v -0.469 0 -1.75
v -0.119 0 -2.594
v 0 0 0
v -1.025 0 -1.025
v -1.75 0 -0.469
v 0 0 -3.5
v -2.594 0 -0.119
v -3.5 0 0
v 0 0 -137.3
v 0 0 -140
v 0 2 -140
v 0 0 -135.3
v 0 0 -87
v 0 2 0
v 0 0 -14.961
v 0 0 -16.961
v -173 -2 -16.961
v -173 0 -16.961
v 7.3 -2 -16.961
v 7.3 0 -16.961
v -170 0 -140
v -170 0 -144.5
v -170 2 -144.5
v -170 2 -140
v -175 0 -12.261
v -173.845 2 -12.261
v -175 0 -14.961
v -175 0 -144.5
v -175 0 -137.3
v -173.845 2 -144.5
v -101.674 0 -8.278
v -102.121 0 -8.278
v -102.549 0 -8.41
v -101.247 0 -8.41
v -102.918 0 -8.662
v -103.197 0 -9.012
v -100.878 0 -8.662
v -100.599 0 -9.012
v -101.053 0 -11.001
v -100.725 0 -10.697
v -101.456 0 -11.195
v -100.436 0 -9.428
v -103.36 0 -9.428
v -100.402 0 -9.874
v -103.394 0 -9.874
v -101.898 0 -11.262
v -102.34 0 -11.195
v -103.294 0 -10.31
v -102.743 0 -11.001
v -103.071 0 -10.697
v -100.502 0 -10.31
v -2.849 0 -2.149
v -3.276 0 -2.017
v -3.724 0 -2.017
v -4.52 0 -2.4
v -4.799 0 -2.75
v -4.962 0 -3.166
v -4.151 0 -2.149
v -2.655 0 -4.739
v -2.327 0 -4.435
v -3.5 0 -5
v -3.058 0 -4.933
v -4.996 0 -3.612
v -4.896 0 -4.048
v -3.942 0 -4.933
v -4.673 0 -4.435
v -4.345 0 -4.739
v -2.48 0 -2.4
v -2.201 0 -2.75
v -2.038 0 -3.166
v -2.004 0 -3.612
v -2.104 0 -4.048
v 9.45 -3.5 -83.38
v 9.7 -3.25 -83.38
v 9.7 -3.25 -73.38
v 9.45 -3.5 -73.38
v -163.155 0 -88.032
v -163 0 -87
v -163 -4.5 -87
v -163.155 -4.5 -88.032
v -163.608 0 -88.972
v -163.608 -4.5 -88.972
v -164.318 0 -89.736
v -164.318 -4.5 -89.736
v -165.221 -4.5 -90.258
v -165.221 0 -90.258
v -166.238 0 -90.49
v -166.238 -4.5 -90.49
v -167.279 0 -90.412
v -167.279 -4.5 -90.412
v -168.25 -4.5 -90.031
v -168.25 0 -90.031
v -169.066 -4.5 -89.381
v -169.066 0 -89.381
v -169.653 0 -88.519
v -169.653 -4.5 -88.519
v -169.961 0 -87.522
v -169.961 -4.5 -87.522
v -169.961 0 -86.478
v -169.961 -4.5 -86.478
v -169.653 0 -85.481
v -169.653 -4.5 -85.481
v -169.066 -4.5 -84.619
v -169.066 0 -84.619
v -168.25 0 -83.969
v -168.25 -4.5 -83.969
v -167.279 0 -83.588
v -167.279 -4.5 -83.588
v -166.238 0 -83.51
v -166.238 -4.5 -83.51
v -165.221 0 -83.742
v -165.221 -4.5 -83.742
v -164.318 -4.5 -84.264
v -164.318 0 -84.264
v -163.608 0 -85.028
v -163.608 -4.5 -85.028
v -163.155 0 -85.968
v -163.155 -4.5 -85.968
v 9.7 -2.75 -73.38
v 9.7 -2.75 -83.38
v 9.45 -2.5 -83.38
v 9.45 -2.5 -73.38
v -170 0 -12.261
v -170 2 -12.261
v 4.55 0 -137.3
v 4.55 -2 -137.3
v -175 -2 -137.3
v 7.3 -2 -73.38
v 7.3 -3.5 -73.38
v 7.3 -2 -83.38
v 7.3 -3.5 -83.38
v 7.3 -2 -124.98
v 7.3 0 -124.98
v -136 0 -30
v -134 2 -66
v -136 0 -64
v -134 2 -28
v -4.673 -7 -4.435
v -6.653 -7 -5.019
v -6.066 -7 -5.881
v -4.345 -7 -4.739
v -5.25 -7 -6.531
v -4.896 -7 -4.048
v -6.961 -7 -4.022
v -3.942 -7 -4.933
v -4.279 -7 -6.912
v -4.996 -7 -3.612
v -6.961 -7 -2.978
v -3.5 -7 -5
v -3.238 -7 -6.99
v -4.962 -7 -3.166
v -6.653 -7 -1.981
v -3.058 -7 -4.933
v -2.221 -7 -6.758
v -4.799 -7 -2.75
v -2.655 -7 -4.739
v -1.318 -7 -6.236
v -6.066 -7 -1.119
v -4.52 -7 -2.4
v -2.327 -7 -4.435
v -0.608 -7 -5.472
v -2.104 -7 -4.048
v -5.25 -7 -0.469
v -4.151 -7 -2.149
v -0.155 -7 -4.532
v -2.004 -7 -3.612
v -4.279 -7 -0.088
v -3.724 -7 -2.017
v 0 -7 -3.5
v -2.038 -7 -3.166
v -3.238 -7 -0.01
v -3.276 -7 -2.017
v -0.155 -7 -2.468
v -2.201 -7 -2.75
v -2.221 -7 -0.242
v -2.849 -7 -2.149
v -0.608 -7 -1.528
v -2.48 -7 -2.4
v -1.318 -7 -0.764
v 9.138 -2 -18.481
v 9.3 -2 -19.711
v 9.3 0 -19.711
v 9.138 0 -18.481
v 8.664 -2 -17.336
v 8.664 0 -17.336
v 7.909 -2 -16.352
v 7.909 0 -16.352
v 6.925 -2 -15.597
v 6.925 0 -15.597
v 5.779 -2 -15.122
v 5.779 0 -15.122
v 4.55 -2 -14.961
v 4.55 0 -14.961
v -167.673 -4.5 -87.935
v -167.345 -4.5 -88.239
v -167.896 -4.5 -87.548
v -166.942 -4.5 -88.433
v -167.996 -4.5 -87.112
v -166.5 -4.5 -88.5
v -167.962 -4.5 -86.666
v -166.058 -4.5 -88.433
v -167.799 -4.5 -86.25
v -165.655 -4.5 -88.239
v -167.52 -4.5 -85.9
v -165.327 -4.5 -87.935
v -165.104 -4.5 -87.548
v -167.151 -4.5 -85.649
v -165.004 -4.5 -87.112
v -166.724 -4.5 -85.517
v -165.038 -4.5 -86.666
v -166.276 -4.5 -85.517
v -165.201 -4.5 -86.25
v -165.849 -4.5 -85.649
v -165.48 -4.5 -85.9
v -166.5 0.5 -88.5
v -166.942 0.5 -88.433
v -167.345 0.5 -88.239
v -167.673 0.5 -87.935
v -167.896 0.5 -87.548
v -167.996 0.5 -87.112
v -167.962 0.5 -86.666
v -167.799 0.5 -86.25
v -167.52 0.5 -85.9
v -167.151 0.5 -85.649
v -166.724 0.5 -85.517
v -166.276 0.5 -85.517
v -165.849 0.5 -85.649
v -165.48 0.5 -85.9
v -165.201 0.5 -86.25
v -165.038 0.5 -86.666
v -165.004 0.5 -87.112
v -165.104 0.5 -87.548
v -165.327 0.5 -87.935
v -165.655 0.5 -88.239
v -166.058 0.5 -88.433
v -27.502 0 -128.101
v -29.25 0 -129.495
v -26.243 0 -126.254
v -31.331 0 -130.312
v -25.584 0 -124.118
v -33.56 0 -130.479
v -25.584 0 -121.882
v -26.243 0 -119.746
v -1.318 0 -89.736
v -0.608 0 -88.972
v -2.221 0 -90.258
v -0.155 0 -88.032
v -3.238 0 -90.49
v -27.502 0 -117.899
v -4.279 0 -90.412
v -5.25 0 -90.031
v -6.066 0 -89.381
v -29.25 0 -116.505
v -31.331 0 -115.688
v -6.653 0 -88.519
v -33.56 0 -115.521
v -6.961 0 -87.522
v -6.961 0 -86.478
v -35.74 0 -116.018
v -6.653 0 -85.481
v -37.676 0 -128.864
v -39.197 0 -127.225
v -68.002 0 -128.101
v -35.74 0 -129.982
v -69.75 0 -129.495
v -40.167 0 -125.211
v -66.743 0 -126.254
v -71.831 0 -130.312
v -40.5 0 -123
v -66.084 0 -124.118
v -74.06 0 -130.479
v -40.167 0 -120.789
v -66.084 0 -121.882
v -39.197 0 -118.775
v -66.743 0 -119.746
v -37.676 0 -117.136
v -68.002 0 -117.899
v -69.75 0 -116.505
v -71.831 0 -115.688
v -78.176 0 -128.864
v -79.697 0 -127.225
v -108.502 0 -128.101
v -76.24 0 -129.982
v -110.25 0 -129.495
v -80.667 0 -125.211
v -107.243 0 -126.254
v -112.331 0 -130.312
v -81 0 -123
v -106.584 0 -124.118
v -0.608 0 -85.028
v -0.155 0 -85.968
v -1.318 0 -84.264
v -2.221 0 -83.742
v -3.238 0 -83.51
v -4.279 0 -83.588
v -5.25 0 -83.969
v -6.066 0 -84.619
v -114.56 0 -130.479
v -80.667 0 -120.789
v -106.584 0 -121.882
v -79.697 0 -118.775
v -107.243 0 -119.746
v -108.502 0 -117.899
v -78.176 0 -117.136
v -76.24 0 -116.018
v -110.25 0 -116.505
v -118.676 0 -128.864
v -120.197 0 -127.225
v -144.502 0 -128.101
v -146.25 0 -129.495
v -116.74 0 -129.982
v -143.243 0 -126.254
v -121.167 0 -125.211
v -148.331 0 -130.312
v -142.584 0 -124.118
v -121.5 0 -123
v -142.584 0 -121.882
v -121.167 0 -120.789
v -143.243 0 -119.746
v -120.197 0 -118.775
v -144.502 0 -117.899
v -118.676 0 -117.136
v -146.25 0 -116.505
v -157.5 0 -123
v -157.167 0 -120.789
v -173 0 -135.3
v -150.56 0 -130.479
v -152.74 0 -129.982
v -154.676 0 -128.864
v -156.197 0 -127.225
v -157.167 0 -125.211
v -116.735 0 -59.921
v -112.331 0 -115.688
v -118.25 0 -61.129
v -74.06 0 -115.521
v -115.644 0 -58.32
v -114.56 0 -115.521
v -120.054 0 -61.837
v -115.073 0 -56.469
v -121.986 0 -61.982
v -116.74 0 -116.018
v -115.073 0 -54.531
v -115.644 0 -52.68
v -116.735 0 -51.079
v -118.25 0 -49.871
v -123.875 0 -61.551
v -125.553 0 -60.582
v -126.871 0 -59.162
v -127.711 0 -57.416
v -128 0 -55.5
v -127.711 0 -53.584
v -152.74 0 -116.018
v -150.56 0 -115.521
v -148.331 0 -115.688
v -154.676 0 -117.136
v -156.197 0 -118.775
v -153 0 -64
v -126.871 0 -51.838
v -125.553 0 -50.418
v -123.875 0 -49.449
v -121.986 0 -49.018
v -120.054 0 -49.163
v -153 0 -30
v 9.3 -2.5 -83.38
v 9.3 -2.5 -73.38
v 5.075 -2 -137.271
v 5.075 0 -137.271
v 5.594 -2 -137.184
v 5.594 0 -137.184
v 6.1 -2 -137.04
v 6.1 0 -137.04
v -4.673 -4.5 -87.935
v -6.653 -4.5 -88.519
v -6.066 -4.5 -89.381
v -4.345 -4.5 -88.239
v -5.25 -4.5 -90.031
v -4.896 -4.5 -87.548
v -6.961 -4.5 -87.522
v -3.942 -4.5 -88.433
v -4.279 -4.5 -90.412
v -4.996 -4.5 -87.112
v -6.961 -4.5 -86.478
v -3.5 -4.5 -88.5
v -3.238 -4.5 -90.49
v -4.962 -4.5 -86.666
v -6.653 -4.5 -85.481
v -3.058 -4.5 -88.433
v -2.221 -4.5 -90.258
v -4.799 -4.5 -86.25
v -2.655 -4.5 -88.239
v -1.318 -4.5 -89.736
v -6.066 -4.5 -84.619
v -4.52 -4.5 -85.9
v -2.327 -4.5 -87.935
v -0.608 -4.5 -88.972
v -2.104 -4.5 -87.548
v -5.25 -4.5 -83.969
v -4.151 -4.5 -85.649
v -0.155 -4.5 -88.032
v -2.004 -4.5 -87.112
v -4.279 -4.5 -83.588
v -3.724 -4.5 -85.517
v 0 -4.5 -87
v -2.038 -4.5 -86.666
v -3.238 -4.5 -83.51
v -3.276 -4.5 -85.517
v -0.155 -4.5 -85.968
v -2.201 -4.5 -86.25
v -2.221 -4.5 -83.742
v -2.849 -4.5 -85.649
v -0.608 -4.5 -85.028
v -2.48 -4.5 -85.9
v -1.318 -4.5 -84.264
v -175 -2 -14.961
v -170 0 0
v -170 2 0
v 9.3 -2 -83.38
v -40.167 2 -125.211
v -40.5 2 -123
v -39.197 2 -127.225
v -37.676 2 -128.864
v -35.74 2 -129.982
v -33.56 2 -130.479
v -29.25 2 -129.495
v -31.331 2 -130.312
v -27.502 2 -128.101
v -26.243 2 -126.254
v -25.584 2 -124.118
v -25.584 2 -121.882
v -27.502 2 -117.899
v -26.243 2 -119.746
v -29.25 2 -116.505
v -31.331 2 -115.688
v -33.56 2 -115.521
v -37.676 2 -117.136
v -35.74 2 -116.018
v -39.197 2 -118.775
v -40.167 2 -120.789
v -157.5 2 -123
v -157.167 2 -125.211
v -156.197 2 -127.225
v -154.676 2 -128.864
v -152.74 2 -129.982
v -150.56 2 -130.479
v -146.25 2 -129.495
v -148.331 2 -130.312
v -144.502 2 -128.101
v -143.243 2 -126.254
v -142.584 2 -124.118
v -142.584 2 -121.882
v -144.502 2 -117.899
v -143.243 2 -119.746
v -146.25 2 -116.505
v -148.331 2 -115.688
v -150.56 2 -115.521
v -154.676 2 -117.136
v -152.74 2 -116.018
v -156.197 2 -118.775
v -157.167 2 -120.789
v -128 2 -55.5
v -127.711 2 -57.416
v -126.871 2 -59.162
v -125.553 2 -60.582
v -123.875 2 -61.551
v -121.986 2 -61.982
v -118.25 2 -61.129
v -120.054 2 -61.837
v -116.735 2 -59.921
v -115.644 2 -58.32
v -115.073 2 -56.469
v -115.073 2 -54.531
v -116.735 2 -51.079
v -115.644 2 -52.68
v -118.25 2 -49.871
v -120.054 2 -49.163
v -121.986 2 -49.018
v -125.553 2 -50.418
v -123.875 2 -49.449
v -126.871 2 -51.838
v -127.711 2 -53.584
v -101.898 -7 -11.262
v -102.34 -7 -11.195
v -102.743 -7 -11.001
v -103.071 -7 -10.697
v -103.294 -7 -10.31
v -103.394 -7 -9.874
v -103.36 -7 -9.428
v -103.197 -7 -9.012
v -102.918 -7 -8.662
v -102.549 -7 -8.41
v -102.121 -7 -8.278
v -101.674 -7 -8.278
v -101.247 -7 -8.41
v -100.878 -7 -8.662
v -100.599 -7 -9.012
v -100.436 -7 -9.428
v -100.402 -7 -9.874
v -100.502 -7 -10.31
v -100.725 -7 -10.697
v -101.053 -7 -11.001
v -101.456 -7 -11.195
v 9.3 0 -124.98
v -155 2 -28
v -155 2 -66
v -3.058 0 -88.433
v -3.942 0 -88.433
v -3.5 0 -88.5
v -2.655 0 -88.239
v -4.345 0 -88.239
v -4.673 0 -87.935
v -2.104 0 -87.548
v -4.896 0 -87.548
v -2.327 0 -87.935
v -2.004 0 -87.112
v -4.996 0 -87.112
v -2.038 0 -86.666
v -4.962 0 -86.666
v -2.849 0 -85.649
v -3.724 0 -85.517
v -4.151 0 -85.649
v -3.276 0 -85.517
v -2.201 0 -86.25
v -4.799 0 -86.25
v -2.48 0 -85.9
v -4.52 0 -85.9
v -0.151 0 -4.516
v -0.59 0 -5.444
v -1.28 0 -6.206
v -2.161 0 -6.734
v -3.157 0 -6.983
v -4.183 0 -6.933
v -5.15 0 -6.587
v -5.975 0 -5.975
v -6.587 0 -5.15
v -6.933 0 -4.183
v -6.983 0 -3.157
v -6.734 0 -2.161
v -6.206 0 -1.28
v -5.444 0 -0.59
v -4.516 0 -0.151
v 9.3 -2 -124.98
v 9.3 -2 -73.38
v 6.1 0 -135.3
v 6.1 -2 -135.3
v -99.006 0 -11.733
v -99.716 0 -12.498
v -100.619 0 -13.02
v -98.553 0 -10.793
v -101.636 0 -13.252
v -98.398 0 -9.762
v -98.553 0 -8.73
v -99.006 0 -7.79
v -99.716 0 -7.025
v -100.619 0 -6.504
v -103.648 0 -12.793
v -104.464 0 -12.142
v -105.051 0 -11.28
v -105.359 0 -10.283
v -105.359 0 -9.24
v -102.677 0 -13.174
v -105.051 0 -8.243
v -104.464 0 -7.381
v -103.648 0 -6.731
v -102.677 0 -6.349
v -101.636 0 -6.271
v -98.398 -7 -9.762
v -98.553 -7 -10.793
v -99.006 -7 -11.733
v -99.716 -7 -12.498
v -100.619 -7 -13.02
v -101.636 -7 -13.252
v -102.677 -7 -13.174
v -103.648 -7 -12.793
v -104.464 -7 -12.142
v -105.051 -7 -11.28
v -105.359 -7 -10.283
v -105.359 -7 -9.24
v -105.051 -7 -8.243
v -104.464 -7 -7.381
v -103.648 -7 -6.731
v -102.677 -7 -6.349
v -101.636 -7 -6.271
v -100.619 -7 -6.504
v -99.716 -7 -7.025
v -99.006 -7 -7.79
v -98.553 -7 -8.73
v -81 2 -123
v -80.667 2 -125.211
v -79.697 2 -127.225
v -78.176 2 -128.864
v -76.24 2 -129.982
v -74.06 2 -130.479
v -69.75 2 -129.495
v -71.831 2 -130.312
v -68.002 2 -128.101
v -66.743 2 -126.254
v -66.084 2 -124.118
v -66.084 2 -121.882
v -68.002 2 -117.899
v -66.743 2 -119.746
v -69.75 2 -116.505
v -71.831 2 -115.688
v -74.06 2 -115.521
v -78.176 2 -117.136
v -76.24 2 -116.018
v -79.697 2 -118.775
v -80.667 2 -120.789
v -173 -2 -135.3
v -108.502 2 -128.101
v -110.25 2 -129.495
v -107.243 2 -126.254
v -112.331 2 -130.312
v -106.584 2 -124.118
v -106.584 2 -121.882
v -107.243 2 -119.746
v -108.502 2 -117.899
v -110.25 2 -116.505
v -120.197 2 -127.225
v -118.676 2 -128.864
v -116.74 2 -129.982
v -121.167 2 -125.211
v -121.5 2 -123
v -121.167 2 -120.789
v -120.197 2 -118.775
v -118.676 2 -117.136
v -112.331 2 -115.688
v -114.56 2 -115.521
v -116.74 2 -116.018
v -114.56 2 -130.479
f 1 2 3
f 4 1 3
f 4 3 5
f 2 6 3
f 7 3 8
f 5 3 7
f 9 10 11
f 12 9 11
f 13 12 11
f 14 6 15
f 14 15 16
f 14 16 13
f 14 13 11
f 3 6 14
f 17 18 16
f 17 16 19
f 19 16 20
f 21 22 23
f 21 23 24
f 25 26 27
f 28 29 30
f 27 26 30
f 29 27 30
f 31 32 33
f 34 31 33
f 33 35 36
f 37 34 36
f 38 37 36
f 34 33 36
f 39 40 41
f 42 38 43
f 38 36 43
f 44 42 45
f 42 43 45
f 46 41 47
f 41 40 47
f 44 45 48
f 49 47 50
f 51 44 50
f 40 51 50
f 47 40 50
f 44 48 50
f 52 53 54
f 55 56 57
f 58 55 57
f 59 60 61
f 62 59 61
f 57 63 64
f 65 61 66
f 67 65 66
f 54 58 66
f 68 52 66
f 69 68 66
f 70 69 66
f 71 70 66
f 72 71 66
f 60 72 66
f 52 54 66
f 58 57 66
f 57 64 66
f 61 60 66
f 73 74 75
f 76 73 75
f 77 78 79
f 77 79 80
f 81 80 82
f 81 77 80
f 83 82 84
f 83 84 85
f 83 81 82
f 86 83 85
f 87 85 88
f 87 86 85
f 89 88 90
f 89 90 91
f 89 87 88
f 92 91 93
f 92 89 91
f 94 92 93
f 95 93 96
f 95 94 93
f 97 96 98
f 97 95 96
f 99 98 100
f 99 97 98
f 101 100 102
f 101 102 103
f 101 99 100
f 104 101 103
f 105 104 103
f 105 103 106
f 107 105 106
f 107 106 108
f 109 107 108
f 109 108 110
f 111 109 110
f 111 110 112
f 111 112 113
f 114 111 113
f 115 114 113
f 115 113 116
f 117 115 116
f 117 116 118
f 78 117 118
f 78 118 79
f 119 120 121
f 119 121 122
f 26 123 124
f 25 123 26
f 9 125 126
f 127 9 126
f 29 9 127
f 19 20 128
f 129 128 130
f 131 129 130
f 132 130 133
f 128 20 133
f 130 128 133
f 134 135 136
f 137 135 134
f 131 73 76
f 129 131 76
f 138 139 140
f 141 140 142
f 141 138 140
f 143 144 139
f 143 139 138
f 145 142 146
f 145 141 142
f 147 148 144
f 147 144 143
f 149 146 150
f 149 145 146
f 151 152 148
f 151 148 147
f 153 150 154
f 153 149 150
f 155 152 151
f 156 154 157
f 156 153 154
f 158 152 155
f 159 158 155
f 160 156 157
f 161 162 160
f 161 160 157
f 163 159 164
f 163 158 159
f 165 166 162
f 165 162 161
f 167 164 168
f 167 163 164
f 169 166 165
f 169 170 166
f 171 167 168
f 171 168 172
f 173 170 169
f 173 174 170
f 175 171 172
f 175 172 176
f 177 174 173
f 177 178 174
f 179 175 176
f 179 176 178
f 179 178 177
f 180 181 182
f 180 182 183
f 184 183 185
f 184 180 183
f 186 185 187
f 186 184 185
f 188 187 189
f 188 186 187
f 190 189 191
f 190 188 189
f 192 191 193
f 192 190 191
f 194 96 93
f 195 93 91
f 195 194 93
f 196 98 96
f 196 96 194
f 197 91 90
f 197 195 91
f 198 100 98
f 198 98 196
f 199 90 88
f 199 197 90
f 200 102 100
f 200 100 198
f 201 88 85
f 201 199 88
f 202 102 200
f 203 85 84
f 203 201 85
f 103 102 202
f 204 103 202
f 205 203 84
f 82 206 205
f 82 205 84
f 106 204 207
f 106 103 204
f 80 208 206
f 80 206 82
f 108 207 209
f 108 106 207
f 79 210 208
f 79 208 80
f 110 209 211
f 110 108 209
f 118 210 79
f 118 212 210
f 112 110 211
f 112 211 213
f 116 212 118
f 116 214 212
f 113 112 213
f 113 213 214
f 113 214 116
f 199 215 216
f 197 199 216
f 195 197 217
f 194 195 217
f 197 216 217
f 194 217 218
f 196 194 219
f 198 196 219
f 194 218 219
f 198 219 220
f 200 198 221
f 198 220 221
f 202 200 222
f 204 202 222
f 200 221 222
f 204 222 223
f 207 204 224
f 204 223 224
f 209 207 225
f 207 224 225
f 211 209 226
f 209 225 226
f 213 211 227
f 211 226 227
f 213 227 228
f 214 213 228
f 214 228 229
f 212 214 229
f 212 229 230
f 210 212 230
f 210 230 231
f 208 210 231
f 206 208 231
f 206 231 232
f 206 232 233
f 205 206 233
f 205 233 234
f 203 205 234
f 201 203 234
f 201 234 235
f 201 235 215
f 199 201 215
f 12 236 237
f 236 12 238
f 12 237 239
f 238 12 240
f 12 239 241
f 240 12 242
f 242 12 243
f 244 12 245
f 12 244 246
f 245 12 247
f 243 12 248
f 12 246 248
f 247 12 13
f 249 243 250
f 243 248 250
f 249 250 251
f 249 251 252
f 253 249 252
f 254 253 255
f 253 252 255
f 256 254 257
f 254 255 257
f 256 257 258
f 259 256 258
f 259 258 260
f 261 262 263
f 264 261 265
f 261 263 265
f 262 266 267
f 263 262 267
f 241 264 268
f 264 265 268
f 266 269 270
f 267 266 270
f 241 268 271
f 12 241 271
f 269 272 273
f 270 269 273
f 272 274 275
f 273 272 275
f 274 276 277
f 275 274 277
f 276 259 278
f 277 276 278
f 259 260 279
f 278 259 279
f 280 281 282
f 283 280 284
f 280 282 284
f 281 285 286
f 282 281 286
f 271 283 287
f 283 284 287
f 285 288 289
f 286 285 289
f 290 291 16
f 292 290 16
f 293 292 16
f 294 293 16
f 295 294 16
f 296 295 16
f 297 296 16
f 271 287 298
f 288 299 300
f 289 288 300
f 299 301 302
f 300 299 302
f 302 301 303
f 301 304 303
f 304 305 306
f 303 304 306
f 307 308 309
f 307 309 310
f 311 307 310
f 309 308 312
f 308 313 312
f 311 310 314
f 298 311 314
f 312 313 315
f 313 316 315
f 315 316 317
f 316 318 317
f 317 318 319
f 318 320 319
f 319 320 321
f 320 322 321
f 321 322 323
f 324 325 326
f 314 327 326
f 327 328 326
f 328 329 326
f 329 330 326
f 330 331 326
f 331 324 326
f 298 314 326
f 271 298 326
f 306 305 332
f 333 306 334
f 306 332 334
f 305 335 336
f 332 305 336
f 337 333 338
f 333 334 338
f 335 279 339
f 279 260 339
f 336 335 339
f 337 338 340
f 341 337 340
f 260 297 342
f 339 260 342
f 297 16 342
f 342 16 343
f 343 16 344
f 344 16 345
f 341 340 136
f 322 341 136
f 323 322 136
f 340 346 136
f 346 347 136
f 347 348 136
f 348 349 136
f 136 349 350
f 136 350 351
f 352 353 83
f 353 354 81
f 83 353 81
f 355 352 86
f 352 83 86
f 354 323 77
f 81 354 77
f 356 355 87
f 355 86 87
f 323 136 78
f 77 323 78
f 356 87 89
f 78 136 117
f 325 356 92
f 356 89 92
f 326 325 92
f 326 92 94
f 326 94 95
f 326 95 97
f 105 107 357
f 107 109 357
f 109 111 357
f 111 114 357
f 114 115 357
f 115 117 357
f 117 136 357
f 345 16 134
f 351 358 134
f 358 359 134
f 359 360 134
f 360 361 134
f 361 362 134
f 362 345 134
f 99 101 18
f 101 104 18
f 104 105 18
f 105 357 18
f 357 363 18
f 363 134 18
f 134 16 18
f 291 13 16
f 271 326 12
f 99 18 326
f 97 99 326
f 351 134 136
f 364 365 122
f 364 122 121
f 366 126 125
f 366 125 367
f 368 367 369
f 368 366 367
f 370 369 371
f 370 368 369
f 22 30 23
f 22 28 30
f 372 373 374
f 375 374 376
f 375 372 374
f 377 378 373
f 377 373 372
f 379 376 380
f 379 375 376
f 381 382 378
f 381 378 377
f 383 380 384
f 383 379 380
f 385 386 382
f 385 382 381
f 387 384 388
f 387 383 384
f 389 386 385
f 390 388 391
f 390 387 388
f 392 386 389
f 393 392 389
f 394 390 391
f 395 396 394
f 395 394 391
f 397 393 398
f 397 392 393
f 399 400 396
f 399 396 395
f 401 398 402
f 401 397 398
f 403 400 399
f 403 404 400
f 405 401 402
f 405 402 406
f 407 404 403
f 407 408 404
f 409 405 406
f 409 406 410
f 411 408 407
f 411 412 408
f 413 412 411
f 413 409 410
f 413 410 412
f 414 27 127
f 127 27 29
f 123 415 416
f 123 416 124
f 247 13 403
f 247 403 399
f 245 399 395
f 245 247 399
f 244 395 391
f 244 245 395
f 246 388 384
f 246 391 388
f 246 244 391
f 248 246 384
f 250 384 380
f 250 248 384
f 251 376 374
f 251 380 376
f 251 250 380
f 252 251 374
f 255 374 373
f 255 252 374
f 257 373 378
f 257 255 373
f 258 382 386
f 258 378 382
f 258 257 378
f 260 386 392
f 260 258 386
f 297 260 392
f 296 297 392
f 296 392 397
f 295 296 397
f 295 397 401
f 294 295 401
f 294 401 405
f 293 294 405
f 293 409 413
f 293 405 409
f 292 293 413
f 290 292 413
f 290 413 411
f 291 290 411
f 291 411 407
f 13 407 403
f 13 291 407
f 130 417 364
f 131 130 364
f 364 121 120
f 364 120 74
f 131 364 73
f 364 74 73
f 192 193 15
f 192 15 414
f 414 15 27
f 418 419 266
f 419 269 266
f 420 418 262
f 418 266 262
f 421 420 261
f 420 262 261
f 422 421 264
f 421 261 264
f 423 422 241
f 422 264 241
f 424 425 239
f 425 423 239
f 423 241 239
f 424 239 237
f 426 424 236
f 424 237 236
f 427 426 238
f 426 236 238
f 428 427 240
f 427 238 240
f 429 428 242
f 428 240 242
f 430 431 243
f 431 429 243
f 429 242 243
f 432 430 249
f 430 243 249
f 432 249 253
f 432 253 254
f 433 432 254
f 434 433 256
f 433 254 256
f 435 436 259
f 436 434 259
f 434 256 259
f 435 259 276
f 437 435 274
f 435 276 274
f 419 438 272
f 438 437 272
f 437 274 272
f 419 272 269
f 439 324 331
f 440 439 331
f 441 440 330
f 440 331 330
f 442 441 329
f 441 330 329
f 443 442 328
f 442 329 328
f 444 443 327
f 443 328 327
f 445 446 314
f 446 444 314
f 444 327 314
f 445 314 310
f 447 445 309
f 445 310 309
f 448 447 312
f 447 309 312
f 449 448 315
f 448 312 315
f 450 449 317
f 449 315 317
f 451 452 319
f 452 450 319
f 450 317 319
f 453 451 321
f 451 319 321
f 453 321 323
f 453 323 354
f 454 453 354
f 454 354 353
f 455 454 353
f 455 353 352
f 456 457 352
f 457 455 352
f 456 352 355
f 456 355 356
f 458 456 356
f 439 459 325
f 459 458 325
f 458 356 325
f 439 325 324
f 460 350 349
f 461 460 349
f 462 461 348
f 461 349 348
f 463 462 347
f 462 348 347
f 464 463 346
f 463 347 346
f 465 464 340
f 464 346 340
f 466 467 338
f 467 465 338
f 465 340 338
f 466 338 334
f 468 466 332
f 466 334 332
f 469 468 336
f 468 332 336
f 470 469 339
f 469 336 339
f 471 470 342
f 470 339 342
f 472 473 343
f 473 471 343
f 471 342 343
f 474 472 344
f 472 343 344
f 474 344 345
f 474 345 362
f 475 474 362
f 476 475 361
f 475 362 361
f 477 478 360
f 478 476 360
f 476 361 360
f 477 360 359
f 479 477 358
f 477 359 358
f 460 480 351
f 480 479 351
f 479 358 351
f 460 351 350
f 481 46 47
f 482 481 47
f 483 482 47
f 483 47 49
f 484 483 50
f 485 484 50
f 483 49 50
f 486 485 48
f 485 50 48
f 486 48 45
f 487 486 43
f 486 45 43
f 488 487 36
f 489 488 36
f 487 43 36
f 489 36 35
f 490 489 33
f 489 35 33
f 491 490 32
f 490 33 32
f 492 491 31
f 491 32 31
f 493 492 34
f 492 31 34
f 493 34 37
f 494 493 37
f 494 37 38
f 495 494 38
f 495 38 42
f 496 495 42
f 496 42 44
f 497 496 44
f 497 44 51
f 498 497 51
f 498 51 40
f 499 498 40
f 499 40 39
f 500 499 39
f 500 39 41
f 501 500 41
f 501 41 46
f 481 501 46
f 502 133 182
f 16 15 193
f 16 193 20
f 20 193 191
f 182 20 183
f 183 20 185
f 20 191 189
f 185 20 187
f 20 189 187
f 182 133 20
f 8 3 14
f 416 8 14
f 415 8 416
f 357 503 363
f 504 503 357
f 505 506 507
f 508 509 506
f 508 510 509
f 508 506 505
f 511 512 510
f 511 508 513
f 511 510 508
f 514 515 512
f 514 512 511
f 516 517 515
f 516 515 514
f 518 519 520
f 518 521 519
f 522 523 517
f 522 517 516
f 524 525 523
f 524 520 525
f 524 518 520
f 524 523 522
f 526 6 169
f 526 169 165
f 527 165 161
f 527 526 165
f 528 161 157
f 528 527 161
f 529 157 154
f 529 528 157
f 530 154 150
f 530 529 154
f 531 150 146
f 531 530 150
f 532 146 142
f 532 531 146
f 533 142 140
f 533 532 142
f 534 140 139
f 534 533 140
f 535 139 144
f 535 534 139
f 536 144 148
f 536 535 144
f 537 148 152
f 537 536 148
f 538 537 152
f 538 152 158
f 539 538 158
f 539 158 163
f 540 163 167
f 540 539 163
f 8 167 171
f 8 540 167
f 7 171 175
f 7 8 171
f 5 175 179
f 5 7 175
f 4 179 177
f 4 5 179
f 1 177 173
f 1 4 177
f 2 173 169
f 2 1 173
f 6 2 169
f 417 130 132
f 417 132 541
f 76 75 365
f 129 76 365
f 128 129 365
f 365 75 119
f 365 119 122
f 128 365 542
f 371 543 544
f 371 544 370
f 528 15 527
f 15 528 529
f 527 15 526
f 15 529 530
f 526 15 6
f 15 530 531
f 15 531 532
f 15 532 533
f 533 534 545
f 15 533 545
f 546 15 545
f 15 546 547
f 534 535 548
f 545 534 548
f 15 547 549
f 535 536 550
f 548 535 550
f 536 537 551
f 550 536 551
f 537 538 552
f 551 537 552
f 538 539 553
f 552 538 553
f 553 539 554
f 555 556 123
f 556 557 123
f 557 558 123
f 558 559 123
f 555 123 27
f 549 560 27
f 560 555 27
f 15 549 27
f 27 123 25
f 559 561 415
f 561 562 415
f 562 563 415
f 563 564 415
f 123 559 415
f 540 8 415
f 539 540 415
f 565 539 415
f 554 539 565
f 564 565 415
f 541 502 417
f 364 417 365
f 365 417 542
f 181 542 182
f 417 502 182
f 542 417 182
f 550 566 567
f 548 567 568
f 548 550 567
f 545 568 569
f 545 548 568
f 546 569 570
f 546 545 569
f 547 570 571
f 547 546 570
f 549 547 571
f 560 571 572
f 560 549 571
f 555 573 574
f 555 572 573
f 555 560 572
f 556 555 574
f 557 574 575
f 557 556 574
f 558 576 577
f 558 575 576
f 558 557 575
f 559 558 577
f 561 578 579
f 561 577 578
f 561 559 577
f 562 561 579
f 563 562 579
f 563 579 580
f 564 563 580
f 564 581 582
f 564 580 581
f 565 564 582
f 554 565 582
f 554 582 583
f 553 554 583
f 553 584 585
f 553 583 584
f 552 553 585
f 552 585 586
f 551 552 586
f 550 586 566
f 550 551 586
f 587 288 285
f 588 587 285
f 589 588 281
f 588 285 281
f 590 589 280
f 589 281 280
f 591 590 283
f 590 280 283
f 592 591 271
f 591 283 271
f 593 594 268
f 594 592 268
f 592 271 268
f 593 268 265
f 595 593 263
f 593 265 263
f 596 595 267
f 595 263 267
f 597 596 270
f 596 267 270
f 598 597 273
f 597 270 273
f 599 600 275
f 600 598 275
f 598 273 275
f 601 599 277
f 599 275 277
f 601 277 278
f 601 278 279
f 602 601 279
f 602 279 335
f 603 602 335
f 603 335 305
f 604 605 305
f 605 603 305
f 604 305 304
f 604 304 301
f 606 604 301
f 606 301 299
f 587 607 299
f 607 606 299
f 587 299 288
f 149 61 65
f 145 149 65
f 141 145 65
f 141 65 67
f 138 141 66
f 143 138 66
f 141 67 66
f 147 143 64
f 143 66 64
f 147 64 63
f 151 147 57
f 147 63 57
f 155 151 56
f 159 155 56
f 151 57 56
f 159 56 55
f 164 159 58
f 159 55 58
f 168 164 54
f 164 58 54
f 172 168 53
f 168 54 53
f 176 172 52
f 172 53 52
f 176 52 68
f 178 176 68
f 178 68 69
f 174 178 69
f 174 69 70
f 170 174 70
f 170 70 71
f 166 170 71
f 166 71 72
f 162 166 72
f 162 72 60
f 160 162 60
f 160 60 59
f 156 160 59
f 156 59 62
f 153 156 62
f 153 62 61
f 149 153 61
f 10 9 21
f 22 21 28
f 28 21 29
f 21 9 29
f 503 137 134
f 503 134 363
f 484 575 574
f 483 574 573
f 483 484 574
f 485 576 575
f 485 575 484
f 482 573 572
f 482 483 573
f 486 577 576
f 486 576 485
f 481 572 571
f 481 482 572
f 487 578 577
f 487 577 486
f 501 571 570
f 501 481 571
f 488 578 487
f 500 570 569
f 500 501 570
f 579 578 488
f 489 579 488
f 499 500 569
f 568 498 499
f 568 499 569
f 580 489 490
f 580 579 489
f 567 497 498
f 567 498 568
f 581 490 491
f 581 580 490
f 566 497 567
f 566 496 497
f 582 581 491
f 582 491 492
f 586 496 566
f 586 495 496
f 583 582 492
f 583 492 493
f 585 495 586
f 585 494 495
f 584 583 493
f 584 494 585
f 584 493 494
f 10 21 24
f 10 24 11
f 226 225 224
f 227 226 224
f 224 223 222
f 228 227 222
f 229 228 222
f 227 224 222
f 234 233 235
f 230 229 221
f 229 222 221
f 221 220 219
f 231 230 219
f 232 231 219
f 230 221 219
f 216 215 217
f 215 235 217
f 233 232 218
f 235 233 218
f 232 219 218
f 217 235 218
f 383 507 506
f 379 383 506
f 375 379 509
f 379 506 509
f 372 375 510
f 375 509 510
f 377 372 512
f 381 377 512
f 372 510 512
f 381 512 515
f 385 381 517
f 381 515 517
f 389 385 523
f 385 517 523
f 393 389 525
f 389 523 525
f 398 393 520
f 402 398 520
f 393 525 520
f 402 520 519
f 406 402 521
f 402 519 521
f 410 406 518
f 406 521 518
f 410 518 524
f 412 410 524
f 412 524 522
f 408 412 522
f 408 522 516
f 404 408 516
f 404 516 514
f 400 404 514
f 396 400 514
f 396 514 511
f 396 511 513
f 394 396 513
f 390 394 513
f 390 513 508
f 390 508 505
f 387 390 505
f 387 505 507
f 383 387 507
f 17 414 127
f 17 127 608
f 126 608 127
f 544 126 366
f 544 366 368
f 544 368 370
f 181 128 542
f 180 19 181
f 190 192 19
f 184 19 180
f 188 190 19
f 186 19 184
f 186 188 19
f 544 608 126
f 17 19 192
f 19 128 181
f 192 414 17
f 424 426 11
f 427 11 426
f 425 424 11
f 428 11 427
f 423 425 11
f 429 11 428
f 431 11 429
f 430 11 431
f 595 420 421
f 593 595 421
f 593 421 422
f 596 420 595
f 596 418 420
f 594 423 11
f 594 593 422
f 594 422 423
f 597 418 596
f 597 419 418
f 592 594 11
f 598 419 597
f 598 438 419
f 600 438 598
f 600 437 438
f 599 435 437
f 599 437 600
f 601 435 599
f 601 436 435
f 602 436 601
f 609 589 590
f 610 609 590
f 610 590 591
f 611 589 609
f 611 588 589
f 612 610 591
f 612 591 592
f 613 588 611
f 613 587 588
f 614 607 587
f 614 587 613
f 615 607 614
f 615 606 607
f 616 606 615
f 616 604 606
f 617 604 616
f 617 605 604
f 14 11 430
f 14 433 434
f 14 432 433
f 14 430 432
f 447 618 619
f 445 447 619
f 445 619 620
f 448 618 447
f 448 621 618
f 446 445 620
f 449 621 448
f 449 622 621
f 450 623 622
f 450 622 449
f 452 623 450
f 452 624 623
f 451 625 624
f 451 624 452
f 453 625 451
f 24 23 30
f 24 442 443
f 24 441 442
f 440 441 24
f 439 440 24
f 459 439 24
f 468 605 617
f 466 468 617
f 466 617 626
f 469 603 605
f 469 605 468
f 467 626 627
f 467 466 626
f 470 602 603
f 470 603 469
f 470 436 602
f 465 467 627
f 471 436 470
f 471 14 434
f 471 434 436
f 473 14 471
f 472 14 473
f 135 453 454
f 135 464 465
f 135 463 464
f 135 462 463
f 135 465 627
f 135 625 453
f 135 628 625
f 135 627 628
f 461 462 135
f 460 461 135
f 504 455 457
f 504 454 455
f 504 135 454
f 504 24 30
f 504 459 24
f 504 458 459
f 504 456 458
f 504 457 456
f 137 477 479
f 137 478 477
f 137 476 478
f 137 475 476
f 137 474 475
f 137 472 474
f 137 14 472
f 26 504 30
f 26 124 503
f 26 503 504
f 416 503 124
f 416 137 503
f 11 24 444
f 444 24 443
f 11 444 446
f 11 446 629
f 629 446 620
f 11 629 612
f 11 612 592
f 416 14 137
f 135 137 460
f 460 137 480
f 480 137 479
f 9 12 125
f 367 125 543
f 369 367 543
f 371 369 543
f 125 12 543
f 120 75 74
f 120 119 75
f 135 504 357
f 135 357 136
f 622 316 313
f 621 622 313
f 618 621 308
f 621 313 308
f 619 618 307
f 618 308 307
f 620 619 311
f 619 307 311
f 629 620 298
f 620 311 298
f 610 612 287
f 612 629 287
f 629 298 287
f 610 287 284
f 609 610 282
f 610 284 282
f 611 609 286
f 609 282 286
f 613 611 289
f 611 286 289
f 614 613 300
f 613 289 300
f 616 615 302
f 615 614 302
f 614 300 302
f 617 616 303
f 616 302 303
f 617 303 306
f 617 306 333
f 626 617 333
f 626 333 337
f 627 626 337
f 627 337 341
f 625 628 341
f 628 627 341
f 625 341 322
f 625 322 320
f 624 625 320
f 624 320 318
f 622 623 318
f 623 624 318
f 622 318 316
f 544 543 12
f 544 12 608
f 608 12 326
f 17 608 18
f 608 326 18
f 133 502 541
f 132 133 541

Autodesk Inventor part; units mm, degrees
ref_plane "YZ Plane" through (0, 0, 0) normal (1, 0, 0) x (0, 1, 0)
ref_plane "XZ Plane" through (0, 0, 0) normal (0, 1, 0) x (-1, 0, 0)
ref_plane "XY Plane" through (0, 0, 0) normal (0, 0, 1) x (1, 0, 0)
sketch "Skizze1" plane through (0, 0, 0) normal (0, 1, 0) x (-1, 0, 0)
  line L0 (0, 0) -> (170, 0)
  line L1 (170, 0) -> (170, -140)
  line L2 (170, -140) -> (0, -140)
  line L3 (0, -140) -> (0, 0)
  circle A0 centre (150, -123) radius 7.5
  circle A1 centre (114, -123) radius 7.5
  circle A2 centre (73.5, -123) radius 7.5
  circle A3 centre (33, -123) radius 7.5
  line L4 (153, -30) -> (136, -30)
  line L5 (136, -30) -> (136, -64)
  line L6 (136, -64) -> (153, -64)
  line L7 (153, -64) -> (153, -30)
  circle A4 centre (121.5, -55.5) radius 6.5
  line L8 (150, -123) -> (0, -123) construction
  dimension "d0" = 170
  dimension "d1" = 140
  dimension "d2" = 15
  dimension "d3" = 123
  dimension "d4" = 20
  dimension "d8" = 56
  dimension "d9" = 96.5
  dimension "d10" = 137
  dimension "d11" = 17
  dimension "d12" = 34
  dimension "d13" = 30
  dimension "d14" = 17
  dimension "d15" = 13
  dimension "d17" = 48.5
  dimension "d100" = 25.5
extrude "Extrusion1" add sketch "Skizze1" along normal blind 2
chamfer "Fase1" distance 2 angle 45 4 edges at (-153, 2, -47) (-144.5, 2, -64) (-136, 2, -47) (-144.5, 2, -30)
sketch "Skizze2" plane through (0, 0, 0) normal (0, -1, 0) x (1, 0, 0)
  circle A0 centre (-101.8979, -9.7616) radius 3.5
  circle A1 centre (-3.5, -87) radius 3.5
  circle A2 centre (-3.5, -3.5) radius 3.5
  line L0 (0, 0) -> (0, -140) projected
  line L1 (0, -140) -> (-170, -140) projected
  line L2 (-170, 0) -> (0, 0) projected
  circle A3 centre (-166.5, -87) radius 3.5
  line L3 (-170, -140) -> (-170, 0) projected
  dimension "d23" = 7
  dimension "d24" = 7
  dimension "d25" = 7
  dimension "d26" = 3.5
  dimension "d28" = 3.5
  dimension "d29" = 3.5
  dimension "d30" = 7
  dimension "d31" = 3.5
  dimension "d32" = 87
  dimension "d33" = 87
extrude "Extrusion2" add sketch "Skizze2" along normal blind 4.5 contours A0 | A1 | A3 | A2
sketch "Skizze3" plane through (-101.8979, -4.5, -9.7616) normal (0, -1, 0) x (1, 0, 0)
  circle A0 centre (0, 0) radius 3.5 projected
  circle A1 centre (98.3979, 6.2616) radius 3.5 projected
  point P0 (101.8979, 9.7616)
extrude "Extrusion3" add sketch "Skizze3" along normal blind 2.5
sketch "Skizze4" plane through (-166.5, -4.5, -87) normal (0, -1, 0) x (1, 0, 0)
  circle A0 centre (163, 0) radius 3.5 projected
  point P0 (166.5, 87)
hole "Bohrung1" at (-3.5, -4.5, -87) direction (0, 1, 0) diameter 3 depth 5
sketch "Skizze5" plane through (-3.5, -7, -3.5) normal (0, -1, 0) x (1, 0, 0)
  circle A0 centre (0, 0) radius 3.5 projected
  point P0 (3.5, 3.5)
hole "Bohrung2" at (-3.5, -7, -3.5) direction (0, 1, 0) diameter 3 depth 7
sketch "Skizze6" plane through (-101.8979, -7, -9.7616) normal (0, -1, 0) x (1, 0, 0)
  circle A0 centre (0, 0) radius 3.5 projected
  point P0 (101.8979, 9.7616)
hole "Bohrung3" at (-101.8979, -7, -9.7616) direction (0, 1, 0) diameter 3 depth 7
sketch "Skizze7" plane through (-166.5, -4.5, -87) normal (0, -1, 0) x (1, 0, 0)
  circle A0 centre (0, 0) radius 3.5 projected
  point P0 (166.5, 87)
hole "Bohrung4" at (-166.5, -4.5, -87) direction (0, 1, 0) diameter 3 depth 5
sketch "Skizze8" plane through (0, 0, 0) normal (0, -1, 0) x (1, 0, 0)
  line L0 (0, -140) -> (-170, -140) projected
  line L1 (0, -140) -> (-8, -140)
  line L2 (-8, -140) -> (-8, -20)
  line L3 (-8, -20) -> (0, -20)
  line L4 (0, -20) -> (0, -140)
  circle A0 centre (-33, -123) radius 7.5 projected
  circle A1 centre (-150, -123) radius 7.5 projected
  line L5 (-170, -24.5) -> (-175, -24.5)
  line L6 (-175, -24.5) -> (-175, -144.5)
  line L7 (-175, -144.5) -> (-170, -144.5)
  line L8 (-170, -144.5) -> (-170, -24.5)
  line L9 (-170, -140) -> (-170, -87) projected
  line L10 (-175, -24.5) -> (-1, -24.5)
  line L11 (-1, -24.5) -> (-1, -12.2606)
  line L12 (-1, -12.2606) -> (-175, -12.2606)
  line L13 (-175, -12.2606) -> (-175, -24.5)
  point P0 (0, 0)
  point P1 (0, 0)
  point P2 (-1, -20)
  dimension "d66" = 25
  dimension "d67" = 25
extrude "Extrusion4" add sketch "Skizze8" against normal blind 2 contours L0 L2 L10 L11 L3 L4 | L8 L7 L6 L5 | L10 L5 L13 L12 L11 L3 L2 | L2 L3 L11 L10
sketch "Skizze9" plane through (0, 0, 0) normal (0, -1, 0) x (1, 0, 0)
  arc A0 (0, -3.5) -> (-3.5, 0) centre (-3.5, -3.5) ccw projected
  circle A1 centre (-3.5, -87) radius 3.5 projected
  circle A2 centre (-101.8979, -9.7616) radius 3.5 projected
  circle A3 centre (-150, -123) radius 7.5 projected
  circle A4 centre (-114, -123) radius 7.5 projected
  circle A5 centre (-73.5, -123) radius 7.5 projected
  circle A6 centre (-33, -123) radius 7.5 projected
  circle A7 centre (-121.5, -55.5) radius 6.5 projected
  line L0 (-153, -30) -> (-153, -64) projected
  line L1 (-136, -30) -> (-153, -30) projected
  line L2 (-136, -64) -> (-136, -30) projected
  line L3 (-153, -64) -> (-136, -64) projected
  circle A8 centre (-166.5, -87) radius 3.5 projected
  line L4 (9.3, -137.3) -> (-175, -137.3)
  line L5 (9.3, -137.3) -> (9.3, -14.9606)
  line L6 (9.3, -14.9606) -> (-175, -14.9606)
  line L7 (-175, -14.9606) -> (-175, -137.3)
  line L8 (12, -120) -> (12, 12.2394) projected
  line L9 (-170, -12.2606) -> (-175, -12.2606) projected
  line L10 (-175, -12.2606) -> (-175, -144.5) projected
  line L11 (0, -140) -> (-175, -140) projected
  line L12 (-173, -16.9606) -> (7.3, -16.9606)
  line L13 (7.3, -16.9606) -> (7.3, -135.3)
  line L14 (7.3, -135.3) -> (-173, -135.3)
  line L15 (-173, -135.3) -> (-173, -16.9606)
  line L16 (-173, -135.3) -> (-173, -137.3)
  point P0 (0, 0)
  dimension "d81" = 127.7394
  dimension "d70" = 2.7
  dimension "d71" = 2.7
  dimension "d72" = 0
  dimension "d73" = 2.7
  dimension "d74" = 2
  dimension "d75" = 2
  dimension "d76" = 2
  dimension "d77" = 2
extrude "Extrusion5" add sketch "Skizze9" along normal blind 2 contours L4 L7 L6 L5
fillet "Rundung1" radius 4.75 2 edges at (9.3, -1, -137.3) (9.3, -1, -14.9606)
sketch "Skizze10" plane through (9.3, 0, -19.7106) normal (1, 0, 0) x (0, 0, -1)
  line L0 (117.5894, 0) -> (-4.75, 0) projected
  line L1 (53.6697, 0) -> (63.6697, 0)
  line L2 (63.6697, 0) -> (63.6697, -3.5)
  line L3 (63.6697, -3.5) -> (53.6697, -3.5)
  line L4 (53.6697, -3.5) -> (53.6697, 0)
  line L5 (58.6697, -3.5) -> (58.6697, 0)
  line L6 (-2.7, 2) -> (120.0394, 2) projected
  line L7 (0, 0) -> (117.3394, 0) projected
  line L8 (53.6697, -2.5) -> (63.6697, -2.5)
  point P0 (-19.7106, 0)
  dimension "d83" = 1
  dimension "d91" = 10
  dimension "d92" = 2.5
extrude "Extrusion6" add sketch "Skizze10" against normal blind 2
extrude "Extrusion7" add sketch "Skizze10" along normal blind 0.4 contours L2 L3 L5 L8 | L5 L3 L4 L8
chamfer "Fase2" distance 0.25 angle 45 2 edges at (9.7, -2.5, -78.3803) (9.7, -3.5, -78.3803)
chamfer "Fase3" distance 2 angle 30 1 edges at (-175, 2, -78.3803) measured on face at (-175, 1.3333, -57.2404)
sketch "Skizze11" plane through (9.3, 0, -19.7106) normal (1, 0, 0) x (0, 0, -1)
  line L0 (112.8394, 0) -> (112.8394, -2) projected
  line L1 (117.3394, 0) -> (105.2695, 0)
  line L2 (105.2695, 0) -> (105.2695, -2)
  line L3 (105.2695, -2) -> (117.3394, -2)
  line L4 (117.3394, -2) -> (117.3394, 0)
  point P0 (-19.7106, 0)
extrude "Extrusion8" cut sketch "Skizze11" against normal blind 3.2
sketch "Skizze12" plane through (4.55, -2, -137.3) normal (0, 0, -1) x (-1, 0, 0)
  line L0 (177.55, 0) -> (-2.75, 0) projected
  line L1 (4.55, 2) -> (179.55, 2) projected
  line L2 (99.55, 0) -> (84.55, 0)
  line L3 (84.55, 0) -> (84.55, 2)
  line L4 (84.55, 2) -> (99.55, 2)
  line L5 (99.55, 2) -> (99.55, 0)
  line L6 (179.55, 2) -> (179.55, 0) projected
  point P0 (0, 2)
  dimension "d98" = 15
  dimension "d99" = 80
properties part number "Fascia"
